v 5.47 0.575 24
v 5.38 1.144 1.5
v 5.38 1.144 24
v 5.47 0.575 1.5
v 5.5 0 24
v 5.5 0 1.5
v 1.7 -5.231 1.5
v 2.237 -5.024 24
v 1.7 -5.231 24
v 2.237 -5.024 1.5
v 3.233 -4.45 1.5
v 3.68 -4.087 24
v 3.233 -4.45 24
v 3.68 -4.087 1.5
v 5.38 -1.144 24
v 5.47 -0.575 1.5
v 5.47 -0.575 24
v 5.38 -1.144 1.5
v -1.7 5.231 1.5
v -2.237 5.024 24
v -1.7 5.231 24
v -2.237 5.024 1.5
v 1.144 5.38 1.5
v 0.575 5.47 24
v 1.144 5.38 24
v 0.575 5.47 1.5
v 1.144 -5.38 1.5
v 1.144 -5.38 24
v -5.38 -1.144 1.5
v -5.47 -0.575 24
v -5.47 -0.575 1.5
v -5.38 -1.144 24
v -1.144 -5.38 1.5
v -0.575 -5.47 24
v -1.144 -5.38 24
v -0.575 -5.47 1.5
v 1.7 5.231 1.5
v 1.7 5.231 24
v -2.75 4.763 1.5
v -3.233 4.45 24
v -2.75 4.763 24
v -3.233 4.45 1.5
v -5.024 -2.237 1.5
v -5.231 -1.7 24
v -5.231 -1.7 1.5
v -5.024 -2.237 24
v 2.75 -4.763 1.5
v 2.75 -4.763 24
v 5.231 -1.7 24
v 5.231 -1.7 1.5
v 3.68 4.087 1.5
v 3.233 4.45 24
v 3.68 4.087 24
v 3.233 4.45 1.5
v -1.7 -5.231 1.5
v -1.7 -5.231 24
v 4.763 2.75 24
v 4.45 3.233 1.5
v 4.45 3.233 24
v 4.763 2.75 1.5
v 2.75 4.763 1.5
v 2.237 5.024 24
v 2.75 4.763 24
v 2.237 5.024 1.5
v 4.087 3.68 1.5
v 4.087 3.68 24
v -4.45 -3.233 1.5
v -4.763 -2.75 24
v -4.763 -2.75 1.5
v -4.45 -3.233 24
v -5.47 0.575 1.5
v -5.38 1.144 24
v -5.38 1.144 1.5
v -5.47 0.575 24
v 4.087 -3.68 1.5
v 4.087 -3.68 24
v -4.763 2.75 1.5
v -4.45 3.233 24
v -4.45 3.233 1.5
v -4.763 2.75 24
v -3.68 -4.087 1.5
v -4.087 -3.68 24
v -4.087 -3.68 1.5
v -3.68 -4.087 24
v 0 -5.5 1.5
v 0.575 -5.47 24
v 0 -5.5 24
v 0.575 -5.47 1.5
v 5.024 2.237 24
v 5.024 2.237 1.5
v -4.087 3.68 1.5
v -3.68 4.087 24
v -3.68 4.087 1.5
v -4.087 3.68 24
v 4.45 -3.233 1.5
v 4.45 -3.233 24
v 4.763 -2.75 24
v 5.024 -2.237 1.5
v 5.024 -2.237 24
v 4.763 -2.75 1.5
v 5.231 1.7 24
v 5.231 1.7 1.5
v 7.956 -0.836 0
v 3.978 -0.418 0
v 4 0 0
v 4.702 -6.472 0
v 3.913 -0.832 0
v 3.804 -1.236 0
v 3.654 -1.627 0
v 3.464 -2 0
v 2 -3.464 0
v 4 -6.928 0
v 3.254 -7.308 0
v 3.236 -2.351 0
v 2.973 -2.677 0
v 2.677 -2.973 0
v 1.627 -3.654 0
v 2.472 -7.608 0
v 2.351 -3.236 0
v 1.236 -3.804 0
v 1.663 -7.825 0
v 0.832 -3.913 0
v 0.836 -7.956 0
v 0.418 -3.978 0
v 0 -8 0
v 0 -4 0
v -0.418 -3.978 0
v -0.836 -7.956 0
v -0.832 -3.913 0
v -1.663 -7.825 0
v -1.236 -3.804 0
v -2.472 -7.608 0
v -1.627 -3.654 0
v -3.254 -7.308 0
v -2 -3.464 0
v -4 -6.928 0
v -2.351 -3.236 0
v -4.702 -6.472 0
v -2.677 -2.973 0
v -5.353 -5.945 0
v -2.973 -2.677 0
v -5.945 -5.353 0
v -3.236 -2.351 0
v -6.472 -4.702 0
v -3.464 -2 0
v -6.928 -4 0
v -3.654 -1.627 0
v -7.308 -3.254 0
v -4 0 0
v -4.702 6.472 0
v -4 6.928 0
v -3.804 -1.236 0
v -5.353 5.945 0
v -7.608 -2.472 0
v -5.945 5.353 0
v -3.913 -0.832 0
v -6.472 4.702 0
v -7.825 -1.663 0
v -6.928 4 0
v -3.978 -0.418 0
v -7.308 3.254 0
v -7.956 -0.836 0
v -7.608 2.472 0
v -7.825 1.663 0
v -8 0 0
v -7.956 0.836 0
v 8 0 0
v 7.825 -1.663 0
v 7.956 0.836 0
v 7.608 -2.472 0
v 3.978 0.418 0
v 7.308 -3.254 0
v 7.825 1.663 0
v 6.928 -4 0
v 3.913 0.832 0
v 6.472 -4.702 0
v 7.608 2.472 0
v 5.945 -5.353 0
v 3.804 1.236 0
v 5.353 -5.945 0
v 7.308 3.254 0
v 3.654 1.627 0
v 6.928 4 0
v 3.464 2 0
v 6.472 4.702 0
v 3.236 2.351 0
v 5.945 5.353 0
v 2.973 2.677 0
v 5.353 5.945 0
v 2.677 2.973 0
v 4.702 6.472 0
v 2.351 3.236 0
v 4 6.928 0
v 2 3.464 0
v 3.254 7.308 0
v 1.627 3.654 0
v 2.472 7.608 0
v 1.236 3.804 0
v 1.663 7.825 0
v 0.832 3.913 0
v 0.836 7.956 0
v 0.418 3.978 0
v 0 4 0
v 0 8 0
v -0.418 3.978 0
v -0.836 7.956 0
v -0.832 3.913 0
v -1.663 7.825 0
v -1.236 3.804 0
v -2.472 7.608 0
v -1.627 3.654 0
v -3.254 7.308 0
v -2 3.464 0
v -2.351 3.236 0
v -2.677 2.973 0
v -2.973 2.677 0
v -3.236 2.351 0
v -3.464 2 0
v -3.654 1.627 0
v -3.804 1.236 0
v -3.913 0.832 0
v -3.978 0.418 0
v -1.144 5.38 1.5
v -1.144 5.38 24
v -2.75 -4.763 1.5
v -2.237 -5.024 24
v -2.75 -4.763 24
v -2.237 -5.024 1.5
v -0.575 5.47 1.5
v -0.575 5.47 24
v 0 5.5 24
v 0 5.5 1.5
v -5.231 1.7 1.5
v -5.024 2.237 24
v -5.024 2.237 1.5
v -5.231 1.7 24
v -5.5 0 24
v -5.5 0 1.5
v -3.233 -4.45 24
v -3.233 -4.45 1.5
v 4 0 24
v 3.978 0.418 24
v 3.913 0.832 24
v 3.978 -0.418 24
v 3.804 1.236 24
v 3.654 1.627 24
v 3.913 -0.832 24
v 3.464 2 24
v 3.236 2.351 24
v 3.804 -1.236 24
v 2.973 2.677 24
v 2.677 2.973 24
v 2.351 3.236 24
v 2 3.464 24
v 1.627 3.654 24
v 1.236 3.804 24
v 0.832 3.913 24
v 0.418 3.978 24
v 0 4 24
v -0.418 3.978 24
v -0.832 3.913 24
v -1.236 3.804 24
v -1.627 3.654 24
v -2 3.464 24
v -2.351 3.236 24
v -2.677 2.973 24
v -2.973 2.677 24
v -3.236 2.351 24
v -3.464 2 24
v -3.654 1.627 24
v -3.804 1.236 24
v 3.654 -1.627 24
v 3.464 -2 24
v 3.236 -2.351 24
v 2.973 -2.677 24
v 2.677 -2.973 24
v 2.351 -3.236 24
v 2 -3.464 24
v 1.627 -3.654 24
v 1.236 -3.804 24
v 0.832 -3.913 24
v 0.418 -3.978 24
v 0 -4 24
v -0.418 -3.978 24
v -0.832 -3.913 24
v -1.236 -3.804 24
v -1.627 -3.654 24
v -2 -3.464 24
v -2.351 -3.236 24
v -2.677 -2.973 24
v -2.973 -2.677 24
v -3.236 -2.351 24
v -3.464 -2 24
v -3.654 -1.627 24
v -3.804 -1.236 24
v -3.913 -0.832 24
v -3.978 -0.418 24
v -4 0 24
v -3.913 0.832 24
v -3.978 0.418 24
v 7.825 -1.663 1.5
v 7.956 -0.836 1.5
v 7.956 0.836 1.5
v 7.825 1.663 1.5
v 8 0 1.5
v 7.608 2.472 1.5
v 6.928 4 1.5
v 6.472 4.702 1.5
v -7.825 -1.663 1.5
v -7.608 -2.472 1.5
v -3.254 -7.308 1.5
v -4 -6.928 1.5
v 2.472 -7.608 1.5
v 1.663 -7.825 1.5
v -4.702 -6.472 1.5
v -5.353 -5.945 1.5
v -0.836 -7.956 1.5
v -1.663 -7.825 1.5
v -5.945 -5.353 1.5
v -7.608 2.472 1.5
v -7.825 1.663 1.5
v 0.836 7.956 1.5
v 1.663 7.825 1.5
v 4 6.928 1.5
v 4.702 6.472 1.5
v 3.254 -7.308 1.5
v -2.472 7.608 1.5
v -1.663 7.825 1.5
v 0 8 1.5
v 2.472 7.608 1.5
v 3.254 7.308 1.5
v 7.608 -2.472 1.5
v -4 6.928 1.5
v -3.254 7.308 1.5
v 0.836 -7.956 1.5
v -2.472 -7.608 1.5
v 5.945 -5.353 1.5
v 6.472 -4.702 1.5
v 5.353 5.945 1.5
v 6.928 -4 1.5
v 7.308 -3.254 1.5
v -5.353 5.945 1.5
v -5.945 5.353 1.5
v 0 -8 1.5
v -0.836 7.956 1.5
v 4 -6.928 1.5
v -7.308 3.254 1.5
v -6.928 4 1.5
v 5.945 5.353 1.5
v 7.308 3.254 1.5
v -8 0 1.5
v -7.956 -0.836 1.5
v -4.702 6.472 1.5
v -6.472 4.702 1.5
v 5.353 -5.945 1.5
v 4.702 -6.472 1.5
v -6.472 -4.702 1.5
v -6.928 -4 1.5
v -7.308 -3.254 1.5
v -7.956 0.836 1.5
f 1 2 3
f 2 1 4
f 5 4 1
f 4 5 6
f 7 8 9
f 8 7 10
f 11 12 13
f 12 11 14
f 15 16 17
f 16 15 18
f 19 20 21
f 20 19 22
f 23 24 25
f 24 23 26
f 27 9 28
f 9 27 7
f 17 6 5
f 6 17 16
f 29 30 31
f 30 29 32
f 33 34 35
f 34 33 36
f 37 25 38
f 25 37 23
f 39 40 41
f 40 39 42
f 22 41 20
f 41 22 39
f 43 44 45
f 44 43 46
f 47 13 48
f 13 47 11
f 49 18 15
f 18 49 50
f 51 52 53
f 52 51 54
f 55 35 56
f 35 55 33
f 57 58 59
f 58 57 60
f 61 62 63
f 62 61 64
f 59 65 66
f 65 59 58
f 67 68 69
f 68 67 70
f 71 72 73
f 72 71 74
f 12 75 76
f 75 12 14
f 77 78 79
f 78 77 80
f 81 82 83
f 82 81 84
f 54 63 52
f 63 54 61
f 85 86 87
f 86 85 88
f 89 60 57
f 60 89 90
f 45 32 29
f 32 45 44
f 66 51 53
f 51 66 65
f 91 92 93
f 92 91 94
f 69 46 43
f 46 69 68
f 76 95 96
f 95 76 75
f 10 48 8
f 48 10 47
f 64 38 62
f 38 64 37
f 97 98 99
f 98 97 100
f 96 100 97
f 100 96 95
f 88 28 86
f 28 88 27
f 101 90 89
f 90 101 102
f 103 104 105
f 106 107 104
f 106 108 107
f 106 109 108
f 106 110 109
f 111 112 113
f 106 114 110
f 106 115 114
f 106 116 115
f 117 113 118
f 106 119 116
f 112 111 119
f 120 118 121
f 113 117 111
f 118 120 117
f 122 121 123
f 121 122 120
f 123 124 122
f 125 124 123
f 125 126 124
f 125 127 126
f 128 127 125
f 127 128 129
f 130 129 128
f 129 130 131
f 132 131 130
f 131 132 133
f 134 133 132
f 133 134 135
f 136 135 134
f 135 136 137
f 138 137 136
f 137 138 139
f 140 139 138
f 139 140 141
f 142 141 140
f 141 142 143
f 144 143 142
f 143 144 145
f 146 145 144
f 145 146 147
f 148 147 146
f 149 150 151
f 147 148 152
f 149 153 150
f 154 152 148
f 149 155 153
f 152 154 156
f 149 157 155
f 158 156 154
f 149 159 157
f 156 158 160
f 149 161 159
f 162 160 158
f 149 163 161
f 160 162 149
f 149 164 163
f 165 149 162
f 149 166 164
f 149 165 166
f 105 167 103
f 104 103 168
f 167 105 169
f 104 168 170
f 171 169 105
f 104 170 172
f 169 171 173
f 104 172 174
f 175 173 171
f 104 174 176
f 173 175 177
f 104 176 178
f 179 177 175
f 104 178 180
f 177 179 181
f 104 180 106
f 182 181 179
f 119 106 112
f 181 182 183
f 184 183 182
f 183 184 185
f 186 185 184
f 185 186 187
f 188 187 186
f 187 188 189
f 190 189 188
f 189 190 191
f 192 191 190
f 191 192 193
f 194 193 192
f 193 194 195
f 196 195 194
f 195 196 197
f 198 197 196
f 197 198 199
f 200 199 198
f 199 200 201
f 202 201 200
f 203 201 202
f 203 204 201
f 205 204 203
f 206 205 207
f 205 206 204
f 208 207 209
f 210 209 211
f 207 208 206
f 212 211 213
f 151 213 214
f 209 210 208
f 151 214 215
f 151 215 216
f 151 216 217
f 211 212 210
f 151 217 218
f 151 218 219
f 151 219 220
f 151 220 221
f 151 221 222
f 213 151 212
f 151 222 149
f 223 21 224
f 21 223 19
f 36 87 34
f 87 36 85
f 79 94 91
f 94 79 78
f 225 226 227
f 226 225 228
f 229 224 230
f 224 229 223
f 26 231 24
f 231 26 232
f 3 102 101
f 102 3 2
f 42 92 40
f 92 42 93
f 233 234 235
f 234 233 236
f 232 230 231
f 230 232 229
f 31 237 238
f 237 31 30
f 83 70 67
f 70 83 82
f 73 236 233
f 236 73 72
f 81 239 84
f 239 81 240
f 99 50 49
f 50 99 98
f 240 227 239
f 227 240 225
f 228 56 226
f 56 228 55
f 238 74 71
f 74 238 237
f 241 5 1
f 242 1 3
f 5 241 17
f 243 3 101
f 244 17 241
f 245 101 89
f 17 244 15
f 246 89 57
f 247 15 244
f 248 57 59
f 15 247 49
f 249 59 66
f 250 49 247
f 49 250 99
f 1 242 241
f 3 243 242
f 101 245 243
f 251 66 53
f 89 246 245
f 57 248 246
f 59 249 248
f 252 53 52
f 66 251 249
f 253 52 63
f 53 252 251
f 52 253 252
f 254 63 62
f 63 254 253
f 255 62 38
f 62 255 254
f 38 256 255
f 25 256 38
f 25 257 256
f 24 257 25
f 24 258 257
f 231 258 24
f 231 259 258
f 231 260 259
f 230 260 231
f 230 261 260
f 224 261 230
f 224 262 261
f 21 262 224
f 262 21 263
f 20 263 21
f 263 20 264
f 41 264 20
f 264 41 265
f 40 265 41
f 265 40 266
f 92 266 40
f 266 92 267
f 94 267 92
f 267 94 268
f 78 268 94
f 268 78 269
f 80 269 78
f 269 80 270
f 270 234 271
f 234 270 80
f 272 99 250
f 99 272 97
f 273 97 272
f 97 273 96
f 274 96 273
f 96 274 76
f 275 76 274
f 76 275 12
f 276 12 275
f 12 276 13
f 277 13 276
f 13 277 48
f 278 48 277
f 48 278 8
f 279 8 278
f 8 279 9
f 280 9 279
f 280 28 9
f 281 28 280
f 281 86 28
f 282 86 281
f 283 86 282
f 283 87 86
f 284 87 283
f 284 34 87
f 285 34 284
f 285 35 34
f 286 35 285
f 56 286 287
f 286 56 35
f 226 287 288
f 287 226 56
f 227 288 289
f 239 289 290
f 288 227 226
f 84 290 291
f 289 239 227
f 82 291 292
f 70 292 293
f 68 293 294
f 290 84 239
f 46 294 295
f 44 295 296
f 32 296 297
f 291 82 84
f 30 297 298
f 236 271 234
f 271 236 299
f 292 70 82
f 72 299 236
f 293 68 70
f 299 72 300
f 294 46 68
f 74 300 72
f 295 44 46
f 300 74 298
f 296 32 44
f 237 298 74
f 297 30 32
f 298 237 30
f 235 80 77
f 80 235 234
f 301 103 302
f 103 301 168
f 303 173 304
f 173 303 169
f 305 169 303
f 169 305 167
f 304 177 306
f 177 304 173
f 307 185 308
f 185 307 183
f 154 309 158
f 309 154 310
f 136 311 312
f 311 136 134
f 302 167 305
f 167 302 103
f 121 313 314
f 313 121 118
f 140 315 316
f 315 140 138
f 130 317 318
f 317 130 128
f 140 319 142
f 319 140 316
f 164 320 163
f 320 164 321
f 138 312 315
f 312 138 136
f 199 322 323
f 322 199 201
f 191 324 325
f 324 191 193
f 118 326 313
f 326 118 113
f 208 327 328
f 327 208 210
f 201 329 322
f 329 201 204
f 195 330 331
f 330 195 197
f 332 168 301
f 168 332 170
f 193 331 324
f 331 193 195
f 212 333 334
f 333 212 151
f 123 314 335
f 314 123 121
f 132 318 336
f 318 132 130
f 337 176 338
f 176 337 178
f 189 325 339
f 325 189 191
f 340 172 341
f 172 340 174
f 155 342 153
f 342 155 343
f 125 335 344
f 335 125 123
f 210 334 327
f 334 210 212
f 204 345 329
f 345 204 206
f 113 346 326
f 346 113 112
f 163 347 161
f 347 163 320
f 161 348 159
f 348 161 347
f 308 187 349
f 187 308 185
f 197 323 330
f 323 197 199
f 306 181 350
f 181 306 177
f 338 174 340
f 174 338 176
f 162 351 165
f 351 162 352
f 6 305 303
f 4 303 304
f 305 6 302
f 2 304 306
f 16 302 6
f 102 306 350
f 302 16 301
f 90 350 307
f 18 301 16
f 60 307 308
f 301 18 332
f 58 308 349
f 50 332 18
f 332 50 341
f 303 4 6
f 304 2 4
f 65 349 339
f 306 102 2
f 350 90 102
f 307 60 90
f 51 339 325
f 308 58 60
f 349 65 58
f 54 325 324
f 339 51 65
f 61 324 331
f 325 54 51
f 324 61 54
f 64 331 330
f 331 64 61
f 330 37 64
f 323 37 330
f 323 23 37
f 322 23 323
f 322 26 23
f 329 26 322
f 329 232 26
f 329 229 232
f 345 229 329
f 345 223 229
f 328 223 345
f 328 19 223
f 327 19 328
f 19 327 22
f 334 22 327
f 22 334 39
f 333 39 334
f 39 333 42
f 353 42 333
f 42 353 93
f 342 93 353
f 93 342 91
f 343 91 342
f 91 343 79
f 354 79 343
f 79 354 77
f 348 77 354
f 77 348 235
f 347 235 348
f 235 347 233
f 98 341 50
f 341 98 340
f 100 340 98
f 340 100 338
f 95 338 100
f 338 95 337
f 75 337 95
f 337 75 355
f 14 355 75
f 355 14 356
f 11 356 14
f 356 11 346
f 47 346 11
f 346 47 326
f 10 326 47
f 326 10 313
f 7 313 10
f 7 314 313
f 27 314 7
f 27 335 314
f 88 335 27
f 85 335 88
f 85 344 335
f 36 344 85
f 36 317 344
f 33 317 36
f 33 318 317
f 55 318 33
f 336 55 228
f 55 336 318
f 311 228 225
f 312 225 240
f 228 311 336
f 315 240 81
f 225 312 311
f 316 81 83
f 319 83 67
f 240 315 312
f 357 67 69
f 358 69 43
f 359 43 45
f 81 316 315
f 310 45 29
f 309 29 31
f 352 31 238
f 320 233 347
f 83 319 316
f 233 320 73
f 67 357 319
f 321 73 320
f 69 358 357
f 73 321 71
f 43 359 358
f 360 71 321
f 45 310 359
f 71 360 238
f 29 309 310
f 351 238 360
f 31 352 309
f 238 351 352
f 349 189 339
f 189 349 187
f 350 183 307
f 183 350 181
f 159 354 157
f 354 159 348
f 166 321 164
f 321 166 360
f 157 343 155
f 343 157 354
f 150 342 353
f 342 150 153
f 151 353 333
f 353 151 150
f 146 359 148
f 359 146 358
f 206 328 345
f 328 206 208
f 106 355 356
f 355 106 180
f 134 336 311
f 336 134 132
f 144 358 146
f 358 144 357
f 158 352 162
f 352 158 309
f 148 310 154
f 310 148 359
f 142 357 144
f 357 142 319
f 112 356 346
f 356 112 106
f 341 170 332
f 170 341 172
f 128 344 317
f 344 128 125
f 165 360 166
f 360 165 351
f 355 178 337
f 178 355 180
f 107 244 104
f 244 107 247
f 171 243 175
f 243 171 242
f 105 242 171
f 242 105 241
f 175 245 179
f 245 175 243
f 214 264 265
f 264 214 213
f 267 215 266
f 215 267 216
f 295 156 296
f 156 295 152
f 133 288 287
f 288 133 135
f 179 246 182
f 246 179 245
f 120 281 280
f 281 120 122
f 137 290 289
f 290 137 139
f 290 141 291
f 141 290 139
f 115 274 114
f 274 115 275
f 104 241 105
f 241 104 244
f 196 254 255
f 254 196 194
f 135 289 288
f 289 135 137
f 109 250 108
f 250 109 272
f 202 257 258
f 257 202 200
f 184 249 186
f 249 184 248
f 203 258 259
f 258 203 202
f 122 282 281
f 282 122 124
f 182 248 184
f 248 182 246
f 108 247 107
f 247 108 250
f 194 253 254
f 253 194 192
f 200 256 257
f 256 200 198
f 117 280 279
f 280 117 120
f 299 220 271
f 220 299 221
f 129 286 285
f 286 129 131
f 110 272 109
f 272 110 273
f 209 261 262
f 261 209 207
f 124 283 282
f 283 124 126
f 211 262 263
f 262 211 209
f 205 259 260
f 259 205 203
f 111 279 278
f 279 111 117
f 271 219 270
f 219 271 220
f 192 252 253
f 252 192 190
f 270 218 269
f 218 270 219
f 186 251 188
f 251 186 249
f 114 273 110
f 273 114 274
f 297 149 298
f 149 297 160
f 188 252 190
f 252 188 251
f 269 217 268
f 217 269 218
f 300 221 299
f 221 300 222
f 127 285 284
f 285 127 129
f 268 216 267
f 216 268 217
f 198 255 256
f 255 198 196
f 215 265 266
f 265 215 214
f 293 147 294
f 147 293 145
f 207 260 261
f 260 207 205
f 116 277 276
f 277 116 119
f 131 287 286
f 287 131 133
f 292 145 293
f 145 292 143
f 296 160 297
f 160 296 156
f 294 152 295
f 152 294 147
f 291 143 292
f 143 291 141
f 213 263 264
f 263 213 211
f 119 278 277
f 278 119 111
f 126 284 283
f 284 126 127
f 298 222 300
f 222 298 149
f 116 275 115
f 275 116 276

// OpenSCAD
// Blind-rivet body.
$fn = 60;
eps = 0.02;
shank_d = 8;
head_d = 16;
length = 24;
difference() { union() { cylinder(d=shank_d+3,h=length); cylinder(d=max(head_d, shank_d+5),h=1.5); } translate([0,0,-eps]) cylinder(d=shank_d,h=length+2*eps); }
